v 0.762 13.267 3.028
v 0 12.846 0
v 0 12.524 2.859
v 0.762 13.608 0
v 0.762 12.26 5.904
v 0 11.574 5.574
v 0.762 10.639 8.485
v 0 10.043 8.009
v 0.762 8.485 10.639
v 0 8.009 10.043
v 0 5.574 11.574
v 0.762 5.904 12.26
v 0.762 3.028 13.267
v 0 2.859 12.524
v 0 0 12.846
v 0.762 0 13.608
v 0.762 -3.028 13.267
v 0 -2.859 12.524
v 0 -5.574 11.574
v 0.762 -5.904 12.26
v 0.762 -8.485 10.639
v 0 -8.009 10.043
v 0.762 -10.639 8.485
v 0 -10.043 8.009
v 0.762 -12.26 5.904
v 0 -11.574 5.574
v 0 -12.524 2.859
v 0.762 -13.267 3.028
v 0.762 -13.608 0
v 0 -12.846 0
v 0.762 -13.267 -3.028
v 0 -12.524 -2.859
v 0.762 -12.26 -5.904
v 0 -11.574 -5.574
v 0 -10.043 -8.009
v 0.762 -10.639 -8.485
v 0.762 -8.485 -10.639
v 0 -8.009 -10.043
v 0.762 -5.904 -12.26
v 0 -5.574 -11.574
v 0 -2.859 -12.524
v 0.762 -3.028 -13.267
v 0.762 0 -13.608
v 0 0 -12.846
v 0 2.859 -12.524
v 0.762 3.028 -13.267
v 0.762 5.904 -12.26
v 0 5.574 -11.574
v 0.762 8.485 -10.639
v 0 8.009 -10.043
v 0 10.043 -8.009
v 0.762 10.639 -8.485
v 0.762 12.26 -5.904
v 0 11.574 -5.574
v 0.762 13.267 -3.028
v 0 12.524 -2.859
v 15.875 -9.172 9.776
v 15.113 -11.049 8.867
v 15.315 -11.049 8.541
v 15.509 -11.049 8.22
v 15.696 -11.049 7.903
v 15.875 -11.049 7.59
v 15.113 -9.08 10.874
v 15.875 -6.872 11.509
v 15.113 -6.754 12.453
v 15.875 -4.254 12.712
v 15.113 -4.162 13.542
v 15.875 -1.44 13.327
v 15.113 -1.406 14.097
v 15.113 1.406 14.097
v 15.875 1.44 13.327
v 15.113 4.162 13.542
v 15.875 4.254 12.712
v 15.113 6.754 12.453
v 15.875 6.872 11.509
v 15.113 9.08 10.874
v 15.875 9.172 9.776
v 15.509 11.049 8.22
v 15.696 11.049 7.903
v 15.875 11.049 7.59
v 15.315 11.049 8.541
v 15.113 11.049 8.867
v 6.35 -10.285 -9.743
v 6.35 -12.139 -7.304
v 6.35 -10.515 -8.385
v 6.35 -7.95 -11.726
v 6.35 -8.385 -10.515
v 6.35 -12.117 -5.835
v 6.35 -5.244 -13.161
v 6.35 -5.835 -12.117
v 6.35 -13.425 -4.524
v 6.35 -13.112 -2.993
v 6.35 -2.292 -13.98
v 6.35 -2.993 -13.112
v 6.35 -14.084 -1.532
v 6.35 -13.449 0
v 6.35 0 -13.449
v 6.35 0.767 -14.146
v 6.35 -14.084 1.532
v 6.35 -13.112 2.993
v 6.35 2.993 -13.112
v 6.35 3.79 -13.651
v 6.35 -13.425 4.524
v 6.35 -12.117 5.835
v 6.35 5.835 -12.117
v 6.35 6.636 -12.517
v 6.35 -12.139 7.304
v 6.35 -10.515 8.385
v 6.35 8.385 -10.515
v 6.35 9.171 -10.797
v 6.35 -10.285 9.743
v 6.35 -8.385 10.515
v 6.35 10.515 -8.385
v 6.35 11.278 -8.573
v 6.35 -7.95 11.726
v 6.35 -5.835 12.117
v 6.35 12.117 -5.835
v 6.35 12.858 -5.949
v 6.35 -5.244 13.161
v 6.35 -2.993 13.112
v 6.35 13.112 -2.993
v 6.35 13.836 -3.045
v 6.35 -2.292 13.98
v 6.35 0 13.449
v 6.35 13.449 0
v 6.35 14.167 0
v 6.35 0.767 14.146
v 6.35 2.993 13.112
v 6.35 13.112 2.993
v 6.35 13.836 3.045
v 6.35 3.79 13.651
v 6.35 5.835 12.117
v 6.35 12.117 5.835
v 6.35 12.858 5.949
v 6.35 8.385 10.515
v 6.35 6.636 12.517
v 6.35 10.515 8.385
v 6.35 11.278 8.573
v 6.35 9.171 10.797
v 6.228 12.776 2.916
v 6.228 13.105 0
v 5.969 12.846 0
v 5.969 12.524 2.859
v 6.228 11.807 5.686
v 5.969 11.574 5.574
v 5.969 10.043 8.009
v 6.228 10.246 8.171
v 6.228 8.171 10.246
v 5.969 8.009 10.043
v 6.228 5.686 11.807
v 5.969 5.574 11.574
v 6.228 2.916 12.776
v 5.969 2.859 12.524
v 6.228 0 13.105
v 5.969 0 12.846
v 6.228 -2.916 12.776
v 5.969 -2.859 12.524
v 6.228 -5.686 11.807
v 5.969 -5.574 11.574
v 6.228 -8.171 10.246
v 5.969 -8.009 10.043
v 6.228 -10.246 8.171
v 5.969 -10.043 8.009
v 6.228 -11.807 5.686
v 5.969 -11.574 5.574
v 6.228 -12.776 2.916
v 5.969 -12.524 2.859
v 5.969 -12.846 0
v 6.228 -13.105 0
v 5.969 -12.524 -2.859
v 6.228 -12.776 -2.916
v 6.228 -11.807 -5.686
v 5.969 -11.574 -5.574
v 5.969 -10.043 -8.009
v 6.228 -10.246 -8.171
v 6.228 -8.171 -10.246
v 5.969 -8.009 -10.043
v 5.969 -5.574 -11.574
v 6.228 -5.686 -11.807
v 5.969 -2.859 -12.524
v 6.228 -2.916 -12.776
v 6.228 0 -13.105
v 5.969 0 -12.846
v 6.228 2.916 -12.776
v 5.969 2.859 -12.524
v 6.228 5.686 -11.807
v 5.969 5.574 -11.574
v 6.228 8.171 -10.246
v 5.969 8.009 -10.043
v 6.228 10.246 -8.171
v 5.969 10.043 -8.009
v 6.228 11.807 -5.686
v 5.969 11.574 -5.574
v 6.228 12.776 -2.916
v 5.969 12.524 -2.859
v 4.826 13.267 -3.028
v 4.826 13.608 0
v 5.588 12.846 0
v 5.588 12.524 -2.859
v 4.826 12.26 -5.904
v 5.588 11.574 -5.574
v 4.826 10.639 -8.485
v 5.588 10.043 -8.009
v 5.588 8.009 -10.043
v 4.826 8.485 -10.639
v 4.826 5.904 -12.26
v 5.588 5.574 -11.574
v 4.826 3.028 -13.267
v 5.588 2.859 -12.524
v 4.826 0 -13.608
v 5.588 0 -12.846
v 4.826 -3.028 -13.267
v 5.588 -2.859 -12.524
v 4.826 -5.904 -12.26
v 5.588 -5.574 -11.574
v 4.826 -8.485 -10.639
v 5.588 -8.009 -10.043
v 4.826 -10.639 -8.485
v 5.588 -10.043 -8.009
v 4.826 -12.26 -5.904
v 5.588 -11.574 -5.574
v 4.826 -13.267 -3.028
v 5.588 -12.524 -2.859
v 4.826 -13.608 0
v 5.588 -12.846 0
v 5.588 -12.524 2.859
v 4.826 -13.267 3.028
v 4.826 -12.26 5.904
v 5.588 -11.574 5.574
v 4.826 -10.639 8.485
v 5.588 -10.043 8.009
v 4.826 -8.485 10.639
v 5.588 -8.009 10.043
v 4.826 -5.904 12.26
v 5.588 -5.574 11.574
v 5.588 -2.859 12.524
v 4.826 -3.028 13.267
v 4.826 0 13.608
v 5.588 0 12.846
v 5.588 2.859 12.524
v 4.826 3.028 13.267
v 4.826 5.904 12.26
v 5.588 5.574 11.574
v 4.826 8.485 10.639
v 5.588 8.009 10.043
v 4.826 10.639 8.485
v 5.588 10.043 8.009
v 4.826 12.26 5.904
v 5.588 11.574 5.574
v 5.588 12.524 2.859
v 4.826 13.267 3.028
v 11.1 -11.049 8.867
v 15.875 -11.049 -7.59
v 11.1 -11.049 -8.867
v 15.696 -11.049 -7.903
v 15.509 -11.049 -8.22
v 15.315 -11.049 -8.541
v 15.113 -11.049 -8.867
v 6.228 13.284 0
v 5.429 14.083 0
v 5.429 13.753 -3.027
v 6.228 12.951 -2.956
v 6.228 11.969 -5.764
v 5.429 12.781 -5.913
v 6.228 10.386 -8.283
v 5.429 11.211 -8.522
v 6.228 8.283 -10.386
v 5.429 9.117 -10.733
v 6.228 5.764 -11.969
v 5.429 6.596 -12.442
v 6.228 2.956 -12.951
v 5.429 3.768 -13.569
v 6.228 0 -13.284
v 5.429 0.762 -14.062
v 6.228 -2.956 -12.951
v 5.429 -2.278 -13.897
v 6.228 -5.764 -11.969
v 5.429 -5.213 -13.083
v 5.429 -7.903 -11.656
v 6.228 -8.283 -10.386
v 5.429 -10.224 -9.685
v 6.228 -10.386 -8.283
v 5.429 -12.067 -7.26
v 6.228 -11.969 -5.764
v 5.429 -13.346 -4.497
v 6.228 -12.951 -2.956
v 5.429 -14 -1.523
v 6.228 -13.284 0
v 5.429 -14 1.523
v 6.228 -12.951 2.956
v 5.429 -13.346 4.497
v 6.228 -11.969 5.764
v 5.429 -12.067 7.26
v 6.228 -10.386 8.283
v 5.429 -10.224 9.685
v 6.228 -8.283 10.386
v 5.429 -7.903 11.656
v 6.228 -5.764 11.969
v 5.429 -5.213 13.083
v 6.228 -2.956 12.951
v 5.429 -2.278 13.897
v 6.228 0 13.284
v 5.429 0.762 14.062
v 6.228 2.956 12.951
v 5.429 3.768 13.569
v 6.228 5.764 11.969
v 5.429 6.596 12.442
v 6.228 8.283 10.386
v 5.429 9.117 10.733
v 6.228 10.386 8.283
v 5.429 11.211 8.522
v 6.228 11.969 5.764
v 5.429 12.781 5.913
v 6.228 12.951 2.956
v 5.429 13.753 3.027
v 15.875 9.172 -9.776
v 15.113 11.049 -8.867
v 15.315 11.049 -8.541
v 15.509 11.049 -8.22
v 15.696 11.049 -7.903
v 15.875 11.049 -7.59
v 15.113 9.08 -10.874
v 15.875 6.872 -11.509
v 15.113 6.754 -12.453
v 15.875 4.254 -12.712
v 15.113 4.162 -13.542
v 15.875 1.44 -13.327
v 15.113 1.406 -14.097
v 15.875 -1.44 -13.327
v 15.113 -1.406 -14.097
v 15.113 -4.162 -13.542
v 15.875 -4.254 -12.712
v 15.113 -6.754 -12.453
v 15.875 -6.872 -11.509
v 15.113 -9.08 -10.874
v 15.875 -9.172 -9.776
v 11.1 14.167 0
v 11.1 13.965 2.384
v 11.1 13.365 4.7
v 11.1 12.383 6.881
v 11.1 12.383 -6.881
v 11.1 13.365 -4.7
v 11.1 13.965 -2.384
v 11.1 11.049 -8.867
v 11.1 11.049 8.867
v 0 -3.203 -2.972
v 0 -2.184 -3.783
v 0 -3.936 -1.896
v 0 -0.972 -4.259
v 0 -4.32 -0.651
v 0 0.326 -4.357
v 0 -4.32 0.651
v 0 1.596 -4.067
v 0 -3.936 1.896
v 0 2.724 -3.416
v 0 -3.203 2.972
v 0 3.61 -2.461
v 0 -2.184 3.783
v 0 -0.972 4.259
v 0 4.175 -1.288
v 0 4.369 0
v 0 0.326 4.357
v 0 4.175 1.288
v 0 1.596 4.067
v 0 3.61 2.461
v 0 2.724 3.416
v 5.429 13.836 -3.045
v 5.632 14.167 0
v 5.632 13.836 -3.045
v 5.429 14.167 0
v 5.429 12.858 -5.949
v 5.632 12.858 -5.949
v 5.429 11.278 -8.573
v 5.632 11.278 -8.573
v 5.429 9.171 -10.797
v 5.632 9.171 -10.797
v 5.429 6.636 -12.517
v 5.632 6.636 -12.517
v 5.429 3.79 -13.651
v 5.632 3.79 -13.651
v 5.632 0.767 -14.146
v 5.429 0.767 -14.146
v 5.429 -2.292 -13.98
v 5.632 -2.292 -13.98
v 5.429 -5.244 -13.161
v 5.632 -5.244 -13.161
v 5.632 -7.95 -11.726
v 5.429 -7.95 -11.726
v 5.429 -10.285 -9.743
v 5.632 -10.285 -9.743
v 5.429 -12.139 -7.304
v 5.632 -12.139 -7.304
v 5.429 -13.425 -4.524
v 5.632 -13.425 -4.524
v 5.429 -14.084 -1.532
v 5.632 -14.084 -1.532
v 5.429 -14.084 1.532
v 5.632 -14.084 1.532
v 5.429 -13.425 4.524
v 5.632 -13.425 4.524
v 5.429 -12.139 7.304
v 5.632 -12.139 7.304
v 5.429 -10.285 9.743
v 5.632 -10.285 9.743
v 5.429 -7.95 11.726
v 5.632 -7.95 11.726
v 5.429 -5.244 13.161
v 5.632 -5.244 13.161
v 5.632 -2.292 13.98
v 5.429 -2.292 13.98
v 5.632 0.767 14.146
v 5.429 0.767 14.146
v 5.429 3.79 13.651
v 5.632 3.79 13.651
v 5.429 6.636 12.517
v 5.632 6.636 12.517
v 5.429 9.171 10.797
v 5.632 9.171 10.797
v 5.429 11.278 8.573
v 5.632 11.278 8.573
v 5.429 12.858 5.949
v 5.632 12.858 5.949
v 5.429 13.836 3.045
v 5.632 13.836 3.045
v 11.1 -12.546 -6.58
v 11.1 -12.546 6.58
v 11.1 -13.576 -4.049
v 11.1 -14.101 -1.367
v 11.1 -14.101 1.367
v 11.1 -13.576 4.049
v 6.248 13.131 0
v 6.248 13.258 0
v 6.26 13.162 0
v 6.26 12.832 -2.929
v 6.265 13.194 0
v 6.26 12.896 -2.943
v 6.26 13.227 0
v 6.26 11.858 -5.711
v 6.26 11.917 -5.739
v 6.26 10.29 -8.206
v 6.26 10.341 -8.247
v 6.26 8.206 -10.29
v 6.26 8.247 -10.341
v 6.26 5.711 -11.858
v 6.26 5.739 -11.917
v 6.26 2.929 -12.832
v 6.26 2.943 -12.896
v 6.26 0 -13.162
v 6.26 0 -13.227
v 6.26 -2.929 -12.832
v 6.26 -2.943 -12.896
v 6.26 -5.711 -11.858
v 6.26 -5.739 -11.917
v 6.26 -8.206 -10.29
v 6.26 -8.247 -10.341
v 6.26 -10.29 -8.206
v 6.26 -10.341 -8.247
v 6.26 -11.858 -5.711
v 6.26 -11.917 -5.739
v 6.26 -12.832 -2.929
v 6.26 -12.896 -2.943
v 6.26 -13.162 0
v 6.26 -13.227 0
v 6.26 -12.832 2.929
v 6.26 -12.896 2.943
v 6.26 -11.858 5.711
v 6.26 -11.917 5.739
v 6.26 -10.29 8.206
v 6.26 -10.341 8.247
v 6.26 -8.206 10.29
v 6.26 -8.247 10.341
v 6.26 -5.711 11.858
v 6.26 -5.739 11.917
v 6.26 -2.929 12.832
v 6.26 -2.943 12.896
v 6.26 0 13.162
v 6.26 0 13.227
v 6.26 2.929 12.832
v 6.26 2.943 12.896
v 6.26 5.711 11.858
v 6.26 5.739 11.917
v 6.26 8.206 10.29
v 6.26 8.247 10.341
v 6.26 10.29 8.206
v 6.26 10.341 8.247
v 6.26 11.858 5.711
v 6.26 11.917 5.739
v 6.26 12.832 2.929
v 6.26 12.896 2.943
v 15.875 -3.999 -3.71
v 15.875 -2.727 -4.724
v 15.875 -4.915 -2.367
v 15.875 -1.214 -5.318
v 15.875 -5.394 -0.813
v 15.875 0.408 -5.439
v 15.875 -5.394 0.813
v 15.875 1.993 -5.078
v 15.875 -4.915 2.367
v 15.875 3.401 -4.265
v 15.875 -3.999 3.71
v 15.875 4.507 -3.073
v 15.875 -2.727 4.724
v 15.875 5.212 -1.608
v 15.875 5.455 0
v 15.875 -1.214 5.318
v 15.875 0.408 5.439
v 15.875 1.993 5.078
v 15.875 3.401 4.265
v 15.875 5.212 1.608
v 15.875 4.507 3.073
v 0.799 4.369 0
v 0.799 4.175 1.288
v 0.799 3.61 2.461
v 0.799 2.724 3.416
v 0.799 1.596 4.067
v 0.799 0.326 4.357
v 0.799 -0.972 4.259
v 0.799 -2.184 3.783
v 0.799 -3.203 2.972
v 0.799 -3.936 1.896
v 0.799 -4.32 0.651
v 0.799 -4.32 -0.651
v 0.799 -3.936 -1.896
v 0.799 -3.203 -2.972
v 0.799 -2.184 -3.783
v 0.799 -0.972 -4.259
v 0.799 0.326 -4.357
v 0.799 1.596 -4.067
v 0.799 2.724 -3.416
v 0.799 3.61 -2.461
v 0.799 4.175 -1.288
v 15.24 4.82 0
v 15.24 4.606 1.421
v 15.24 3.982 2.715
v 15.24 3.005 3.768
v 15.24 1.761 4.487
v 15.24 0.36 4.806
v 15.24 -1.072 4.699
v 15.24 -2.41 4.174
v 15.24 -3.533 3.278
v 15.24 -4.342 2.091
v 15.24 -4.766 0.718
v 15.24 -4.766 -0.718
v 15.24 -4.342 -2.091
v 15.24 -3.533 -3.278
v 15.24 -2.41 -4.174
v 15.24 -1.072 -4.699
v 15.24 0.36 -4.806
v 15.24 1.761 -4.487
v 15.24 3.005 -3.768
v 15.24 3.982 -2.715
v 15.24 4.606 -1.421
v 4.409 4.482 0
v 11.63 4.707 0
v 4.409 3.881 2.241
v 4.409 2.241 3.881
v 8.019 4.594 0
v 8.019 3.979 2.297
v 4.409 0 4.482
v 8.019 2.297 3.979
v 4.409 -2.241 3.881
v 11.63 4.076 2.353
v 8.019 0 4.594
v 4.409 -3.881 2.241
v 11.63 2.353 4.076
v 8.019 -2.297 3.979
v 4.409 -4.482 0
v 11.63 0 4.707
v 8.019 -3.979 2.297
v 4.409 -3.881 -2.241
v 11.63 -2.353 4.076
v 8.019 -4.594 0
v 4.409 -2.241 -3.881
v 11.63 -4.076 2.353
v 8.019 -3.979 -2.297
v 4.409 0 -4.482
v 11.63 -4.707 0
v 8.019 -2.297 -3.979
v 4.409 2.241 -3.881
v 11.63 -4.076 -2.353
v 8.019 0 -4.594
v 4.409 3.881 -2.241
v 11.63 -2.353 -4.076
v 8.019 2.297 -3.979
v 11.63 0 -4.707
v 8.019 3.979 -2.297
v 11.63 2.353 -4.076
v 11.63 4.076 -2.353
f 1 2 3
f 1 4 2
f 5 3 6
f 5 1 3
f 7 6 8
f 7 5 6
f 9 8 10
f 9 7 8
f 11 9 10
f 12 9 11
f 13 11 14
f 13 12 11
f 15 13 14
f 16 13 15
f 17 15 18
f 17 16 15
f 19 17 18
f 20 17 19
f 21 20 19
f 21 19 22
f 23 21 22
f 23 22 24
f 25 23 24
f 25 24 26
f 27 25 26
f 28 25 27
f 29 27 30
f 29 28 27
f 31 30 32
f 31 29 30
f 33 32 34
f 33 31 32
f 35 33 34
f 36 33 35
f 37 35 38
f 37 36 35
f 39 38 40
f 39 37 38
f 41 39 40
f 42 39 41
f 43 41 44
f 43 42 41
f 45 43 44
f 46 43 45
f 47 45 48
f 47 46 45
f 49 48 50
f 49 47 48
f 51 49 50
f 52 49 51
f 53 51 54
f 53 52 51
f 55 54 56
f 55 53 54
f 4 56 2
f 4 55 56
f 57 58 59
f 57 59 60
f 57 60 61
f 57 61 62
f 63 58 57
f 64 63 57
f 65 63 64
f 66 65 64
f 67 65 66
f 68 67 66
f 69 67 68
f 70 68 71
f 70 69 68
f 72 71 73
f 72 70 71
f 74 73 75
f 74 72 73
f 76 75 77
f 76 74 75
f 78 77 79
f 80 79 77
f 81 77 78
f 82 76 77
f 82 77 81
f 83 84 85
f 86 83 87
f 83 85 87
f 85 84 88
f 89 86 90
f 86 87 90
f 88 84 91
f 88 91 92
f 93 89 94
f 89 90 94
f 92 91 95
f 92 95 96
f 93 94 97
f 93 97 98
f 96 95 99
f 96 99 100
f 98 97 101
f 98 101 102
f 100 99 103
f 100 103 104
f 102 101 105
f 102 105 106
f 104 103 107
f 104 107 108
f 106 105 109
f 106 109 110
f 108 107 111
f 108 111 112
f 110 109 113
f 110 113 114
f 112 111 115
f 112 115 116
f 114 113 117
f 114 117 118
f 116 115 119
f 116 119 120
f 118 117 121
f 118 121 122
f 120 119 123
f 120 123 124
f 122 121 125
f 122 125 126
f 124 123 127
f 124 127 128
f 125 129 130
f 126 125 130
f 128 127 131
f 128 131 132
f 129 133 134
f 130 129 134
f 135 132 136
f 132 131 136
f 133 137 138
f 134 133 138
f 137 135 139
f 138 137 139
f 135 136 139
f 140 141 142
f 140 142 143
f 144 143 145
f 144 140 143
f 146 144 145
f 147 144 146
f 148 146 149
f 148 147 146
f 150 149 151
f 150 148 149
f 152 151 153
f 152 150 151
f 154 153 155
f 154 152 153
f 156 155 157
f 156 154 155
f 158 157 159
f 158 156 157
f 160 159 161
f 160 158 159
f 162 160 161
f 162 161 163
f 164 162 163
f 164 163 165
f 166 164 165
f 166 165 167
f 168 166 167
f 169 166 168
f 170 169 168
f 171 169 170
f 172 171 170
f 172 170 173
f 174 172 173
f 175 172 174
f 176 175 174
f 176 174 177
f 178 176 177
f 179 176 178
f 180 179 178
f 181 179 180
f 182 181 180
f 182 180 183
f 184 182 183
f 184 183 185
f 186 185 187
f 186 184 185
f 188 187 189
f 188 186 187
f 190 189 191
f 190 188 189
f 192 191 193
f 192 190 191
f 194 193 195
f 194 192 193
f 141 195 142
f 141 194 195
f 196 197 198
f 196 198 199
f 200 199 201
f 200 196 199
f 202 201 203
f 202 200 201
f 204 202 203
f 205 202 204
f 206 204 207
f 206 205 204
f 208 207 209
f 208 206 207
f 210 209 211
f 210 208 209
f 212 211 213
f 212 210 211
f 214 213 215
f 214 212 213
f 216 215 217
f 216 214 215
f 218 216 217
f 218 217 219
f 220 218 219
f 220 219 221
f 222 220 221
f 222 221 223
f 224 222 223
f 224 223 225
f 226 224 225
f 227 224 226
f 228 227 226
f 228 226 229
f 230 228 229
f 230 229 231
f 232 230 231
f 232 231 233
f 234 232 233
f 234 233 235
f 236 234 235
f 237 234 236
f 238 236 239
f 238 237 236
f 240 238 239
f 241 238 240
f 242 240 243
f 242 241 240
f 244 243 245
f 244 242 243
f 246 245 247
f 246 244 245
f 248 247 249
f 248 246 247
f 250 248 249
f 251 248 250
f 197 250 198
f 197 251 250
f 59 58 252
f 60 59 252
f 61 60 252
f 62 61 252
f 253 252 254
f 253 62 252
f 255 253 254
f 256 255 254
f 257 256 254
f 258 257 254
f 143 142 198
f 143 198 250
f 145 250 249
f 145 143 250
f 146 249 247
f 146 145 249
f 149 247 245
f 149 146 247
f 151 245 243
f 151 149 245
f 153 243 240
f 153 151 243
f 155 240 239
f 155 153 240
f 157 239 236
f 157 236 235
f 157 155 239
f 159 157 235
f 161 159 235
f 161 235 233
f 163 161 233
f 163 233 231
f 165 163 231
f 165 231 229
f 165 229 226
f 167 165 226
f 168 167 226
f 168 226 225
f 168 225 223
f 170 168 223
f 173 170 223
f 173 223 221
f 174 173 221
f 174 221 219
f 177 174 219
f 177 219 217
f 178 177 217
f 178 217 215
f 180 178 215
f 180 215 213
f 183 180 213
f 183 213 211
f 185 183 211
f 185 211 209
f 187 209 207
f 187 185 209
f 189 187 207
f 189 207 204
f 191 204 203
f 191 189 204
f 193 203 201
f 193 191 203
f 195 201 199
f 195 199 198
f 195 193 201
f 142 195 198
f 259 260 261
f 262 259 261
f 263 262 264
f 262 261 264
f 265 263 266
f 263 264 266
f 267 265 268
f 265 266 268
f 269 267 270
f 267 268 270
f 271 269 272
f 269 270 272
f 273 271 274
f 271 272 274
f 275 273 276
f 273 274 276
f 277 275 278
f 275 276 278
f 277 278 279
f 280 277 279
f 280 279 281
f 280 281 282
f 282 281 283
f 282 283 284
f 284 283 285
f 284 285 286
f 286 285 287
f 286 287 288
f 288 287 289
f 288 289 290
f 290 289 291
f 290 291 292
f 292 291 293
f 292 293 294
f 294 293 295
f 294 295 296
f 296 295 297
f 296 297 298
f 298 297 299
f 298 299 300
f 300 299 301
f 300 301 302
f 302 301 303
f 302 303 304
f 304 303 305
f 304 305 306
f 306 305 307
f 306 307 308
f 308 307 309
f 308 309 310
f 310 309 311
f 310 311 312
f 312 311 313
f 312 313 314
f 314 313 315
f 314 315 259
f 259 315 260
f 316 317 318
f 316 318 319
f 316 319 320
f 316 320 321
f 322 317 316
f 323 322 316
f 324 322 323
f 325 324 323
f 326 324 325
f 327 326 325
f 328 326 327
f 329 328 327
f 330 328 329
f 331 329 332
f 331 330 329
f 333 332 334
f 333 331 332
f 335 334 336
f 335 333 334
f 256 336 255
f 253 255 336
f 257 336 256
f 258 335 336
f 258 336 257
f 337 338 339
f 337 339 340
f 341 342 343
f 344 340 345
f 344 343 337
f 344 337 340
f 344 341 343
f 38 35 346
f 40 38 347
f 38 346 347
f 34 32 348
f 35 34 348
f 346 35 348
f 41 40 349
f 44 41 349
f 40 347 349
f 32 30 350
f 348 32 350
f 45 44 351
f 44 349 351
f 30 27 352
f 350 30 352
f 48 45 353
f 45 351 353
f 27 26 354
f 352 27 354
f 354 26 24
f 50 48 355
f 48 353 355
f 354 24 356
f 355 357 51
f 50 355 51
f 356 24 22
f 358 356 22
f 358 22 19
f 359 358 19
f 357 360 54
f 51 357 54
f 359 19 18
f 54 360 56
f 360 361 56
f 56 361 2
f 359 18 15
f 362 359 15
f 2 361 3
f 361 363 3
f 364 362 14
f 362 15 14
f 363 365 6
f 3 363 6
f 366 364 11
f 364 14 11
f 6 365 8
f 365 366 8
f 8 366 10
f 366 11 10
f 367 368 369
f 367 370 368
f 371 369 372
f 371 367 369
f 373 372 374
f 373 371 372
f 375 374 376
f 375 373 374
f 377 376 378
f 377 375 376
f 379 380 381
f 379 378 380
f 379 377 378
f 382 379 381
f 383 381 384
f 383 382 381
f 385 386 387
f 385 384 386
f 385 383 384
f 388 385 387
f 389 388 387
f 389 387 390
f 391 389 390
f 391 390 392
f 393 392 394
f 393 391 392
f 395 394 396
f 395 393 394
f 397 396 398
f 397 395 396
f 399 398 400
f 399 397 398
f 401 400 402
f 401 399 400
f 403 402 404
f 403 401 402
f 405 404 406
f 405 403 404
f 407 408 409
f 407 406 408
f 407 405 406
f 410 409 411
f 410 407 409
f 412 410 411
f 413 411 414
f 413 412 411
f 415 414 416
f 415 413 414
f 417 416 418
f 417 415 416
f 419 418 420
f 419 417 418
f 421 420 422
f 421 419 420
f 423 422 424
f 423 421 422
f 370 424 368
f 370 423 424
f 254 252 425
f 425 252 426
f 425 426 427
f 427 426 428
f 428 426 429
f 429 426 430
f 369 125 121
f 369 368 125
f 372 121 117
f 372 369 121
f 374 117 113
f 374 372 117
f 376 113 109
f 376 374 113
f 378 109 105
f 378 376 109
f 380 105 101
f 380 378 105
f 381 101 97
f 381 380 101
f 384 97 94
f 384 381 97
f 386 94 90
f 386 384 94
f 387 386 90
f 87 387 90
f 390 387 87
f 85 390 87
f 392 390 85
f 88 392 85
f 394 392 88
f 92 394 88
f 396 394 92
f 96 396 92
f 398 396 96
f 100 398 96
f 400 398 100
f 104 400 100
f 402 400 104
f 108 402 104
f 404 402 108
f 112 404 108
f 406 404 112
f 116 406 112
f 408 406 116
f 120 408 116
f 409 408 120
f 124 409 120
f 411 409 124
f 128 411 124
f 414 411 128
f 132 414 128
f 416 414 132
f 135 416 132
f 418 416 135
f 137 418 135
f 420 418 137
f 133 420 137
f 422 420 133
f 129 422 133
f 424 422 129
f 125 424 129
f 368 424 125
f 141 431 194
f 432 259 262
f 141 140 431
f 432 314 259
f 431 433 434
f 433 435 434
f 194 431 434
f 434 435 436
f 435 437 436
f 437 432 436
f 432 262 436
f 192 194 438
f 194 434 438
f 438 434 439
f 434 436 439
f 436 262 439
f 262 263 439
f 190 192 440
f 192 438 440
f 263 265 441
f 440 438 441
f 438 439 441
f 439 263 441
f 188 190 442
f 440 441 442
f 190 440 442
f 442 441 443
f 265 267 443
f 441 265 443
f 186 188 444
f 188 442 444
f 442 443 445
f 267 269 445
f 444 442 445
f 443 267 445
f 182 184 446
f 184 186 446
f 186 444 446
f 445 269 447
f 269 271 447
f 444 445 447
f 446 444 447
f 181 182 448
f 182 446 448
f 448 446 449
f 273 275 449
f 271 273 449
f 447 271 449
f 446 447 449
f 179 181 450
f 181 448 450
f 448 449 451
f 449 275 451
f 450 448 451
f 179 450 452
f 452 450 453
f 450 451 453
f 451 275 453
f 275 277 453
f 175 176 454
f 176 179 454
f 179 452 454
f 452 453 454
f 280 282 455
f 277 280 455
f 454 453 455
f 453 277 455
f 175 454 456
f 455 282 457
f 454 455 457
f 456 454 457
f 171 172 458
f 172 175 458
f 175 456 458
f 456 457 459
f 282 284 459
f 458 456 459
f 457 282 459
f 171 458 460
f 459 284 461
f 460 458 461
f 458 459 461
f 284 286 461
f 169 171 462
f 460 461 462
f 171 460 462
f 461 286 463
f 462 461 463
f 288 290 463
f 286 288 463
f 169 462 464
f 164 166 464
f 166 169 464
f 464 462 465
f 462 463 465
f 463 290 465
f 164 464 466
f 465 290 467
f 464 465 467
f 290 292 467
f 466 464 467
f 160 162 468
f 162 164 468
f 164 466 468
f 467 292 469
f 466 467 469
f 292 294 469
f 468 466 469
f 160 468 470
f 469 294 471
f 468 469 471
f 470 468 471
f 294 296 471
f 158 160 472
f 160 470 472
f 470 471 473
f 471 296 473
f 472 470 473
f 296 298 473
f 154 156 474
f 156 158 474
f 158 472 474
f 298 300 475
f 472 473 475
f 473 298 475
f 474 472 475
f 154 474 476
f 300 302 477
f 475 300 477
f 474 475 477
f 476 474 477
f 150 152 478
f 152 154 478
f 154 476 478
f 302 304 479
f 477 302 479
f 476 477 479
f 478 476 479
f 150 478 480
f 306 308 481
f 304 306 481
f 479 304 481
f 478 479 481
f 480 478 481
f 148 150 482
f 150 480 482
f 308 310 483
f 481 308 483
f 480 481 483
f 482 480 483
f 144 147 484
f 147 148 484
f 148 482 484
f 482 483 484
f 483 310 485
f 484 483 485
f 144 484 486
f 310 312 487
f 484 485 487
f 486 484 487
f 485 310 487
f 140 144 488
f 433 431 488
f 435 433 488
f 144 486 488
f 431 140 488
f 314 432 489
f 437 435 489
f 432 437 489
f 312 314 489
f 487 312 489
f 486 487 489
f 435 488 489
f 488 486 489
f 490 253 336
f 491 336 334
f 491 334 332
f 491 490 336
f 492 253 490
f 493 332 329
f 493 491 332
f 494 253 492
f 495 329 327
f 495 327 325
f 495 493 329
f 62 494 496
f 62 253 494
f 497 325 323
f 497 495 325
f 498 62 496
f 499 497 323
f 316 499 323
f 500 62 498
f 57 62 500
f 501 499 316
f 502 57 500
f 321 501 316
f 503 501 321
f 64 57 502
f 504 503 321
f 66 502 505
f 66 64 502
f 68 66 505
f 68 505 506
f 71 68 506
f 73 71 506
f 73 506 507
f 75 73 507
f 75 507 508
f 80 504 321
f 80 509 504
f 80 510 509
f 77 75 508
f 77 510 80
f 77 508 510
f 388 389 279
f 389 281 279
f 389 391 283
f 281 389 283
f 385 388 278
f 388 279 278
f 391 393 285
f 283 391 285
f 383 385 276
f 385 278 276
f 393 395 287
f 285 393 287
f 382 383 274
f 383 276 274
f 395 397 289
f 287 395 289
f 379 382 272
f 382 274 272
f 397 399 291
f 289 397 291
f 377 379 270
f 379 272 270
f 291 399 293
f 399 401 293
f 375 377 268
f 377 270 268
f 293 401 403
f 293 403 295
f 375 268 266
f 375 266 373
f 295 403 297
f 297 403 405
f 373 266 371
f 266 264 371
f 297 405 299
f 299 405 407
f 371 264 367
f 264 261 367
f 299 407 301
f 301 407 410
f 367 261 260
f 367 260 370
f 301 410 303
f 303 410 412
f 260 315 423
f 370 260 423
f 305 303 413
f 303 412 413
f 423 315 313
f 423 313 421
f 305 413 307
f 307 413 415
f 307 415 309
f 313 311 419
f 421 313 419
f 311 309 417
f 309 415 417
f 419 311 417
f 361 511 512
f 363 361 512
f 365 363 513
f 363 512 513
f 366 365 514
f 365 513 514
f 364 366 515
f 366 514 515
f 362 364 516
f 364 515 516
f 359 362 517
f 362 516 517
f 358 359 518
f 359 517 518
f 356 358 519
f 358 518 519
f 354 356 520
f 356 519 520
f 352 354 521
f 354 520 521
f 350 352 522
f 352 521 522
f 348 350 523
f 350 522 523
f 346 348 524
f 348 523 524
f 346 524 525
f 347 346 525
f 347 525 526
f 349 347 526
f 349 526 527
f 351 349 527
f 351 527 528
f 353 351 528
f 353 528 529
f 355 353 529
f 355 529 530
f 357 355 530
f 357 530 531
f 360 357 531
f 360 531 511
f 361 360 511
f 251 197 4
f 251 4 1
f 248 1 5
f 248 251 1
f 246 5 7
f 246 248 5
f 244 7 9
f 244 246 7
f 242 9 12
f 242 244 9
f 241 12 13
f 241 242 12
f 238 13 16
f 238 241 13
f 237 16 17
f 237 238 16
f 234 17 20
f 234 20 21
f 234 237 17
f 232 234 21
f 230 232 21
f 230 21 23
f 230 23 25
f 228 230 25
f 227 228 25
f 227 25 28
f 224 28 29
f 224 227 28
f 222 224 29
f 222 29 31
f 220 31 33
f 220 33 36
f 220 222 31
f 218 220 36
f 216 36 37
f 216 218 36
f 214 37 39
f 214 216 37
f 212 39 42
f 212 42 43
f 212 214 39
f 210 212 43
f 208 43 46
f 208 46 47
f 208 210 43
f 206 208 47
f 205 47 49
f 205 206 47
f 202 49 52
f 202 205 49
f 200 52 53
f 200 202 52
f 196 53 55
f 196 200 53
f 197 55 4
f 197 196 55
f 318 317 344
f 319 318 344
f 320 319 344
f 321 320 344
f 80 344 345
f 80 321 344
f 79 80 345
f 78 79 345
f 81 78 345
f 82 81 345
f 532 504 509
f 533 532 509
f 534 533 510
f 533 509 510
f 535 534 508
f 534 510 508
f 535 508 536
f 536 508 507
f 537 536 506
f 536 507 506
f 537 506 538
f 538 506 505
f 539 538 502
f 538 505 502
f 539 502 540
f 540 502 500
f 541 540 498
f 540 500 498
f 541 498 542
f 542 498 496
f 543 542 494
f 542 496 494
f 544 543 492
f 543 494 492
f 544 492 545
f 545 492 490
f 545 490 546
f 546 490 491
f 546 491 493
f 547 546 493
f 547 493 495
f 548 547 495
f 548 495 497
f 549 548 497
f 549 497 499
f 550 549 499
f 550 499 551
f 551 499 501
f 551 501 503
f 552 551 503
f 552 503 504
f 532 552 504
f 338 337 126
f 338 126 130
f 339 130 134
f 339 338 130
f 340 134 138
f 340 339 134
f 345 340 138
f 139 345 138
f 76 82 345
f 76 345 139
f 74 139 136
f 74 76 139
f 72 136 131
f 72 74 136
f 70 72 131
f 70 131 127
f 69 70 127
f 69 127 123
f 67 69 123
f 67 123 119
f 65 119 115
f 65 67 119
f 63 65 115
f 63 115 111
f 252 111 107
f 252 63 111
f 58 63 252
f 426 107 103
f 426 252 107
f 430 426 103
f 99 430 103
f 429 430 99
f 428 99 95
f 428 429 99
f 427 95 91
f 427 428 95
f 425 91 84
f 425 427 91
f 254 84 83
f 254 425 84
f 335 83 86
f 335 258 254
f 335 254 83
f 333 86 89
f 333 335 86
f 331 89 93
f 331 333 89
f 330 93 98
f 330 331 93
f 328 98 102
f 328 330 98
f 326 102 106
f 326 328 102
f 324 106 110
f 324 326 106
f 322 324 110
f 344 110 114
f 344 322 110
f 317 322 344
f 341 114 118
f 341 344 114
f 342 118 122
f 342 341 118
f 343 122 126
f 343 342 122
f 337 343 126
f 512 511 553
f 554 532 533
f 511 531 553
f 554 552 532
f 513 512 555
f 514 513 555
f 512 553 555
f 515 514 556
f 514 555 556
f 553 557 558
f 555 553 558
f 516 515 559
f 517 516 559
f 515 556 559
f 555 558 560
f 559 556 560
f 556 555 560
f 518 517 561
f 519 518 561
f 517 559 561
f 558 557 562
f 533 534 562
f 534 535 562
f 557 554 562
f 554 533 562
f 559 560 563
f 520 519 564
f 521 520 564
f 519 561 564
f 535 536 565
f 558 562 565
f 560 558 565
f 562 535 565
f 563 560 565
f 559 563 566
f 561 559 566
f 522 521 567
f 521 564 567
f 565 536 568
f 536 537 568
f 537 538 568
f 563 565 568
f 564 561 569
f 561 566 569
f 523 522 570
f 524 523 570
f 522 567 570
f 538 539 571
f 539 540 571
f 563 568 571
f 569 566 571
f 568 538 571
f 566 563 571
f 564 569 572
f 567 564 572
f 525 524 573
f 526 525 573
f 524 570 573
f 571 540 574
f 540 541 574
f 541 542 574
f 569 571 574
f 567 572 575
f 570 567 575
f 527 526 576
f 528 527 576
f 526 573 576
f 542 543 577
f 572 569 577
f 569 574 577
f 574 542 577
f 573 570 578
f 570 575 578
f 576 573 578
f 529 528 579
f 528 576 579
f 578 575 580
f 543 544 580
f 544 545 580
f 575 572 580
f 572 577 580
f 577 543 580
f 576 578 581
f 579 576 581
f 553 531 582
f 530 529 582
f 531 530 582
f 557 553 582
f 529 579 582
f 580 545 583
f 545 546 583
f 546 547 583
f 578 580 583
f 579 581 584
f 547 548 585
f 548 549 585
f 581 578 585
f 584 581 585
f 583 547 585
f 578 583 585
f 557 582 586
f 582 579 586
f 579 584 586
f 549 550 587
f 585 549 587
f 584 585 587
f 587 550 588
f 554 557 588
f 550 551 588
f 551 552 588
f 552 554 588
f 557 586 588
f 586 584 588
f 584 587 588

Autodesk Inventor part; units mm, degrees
sketch "Sketch_1" plane through (0, 0, 0) normal (0, 0, 1) x (1, 0, 0)
  line L0 (15.875, 0) -> (0, 0)
  line L1 (0, 0) -> (0, 12.846)
  line L2 (0, 12.846) -> (0.762, 13.6081)
  line L3 (0.762, 13.6081) -> (4.826, 13.6081)
  line L4 (4.826, 13.6081) -> (5.588, 12.846)
  line L5 (5.588, 12.846) -> (6.35, 12.846)
  line L6 (6.35, 12.846) -> (6.35, 14.1669)
  line L7 (6.35, 14.1669) -> (15.113, 14.1669)
  line L8 (15.113, 14.1669) -> (15.875, 13.4049)
  line L9 (15.875, 13.4049) -> (15.875, 0)
  line L10 (15.875, 0) -> (0, 0)
revolve "Revolution1" add sketch "Sketch_1" angle 360 about axis through (15.875, 0, 0) along (1, 0, 0)
sketch "Sketch_6" plane through (0, 0, 0) normal (0, 0, 1) x (1, 0, 0)
  line L0 (15.875, 0) -> (0, 0)
  line L1 (0, 0) -> (0, 4.3688)
  line L2 (0, 4.3688) -> (0.7987, 4.3688)
  line L3 (0.7987, 4.3688) -> (15.24, 4.8197)
  line L4 (15.24, 4.8197) -> (15.875, 5.4547)
  line L5 (15.875, 5.4547) -> (15.875, 0)
  line L6 (15.875, 0) -> (0, 0)
revolve "Revolution2" cut sketch "Sketch_6" angle 360 about axis through (15.875, 0, 0) along (1, 0, 0)
thread "Thread1" size "1/8" designation "1/8 - 27 NPT" standard "NPT" length 6.3022
sketch "Sketch_5" plane through (15.875, 0, 0) normal (1, 0, 0) x (0, 0, -1)
  line L0 (-56.6674, -28.3337) -> (56.6674, -28.3337)
  line L1 (56.6674, -28.3337) -> (56.6674, 28.3337)
  line L2 (56.6674, 28.3337) -> (-56.6674, 28.3337)
  line L3 (-56.6674, 28.3337) -> (-56.6674, -28.3337)
  line L4 (-28.3337, -11.049) -> (28.3337, -11.049)
  line L5 (28.3337, -11.049) -> (28.3337, 11.049)
  line L6 (28.3337, 11.049) -> (-28.3337, 11.049)
  line L7 (-28.3337, 11.049) -> (-28.3337, -11.049)
extrude "Extrusion1" cut sketch "Sketch_5" against normal blind 4.7752
sketch "Sketch_24" plane through (0, 0, 0) normal (0, 0, 1) x (1, 0, 0)
  line L0 (6.35, 0) -> (5.588, 0)
  line L1 (5.429, 14.1669) -> (5.429, 14.0827)
  line L2 (5.429, 14.0827) -> (6.2275, 13.2842)
  arc A0 (6.2275, 13.1046) -> (6.2275, 13.2842) centre (6.1377, 13.1944) ccw
  line L3 (6.2275, 13.1046) -> (5.969, 12.846)
  line L4 (5.969, 12.846) -> (5.588, 12.846)
  line L5 (5.588, 12.846) -> (5.588, 12.5921)
  line L6 (5.588, 12.5921) -> (6.35, 12.5921)
  line L7 (6.35, 12.5921) -> (6.35, 13.449)
  line L8 (6.35, 13.449) -> (5.6322, 14.1669)
  line L9 (5.6322, 14.1669) -> (5.429, 14.1669)
revolve "Revolution3" add sketch "Sketch_24" angle 360 about axis through (6.35, 0, 0) along (1, 0, 0)
ref_plane "cut1_XY" through (15.875, 11.049, 0) normal (1, 0, 0) x (0, 0, -1)
ref_plane "cut1_YZ" through (15.875, 11.049, 0) normal (0, 0, -1) x (0, 1, 0)
ref_plane "cut1_ZX" through (15.875, 11.049, 0) normal (0, 1, 0) x (1, 0, 0)
ref_plane "cut2_XY" through (15.875, -11.049, 0) normal (1, 0, 0) x (0, 0, -1)
ref_plane "cut2_YZ" through (15.875, -11.049, 0) normal (0, 0, -1) x (0, 1, 0)
ref_plane "cut2_ZX" through (15.875, -11.049, 0) normal (0, 1, 0) x (1, 0, 0)
ref_plane "cutf1_XY" through (15.875, 0, 0) normal (0, 0, 1) x (1, 0, 0)
ref_plane "cutf1_YZ" through (15.875, 0, 0) normal (1, 0, 0) x (0, 1, 0)
ref_plane "cutf1_ZX" through (15.875, 0, 0) normal (0, 1, 0) x (0, 0, 1)
ref_plane "cutf2_XY" through (11.0998, 0, 0) normal (0, 0, 1) x (1, 0, 0)
ref_plane "cutf2_YZ" through (11.0998, 0, 0) normal (1, 0, 0) x (0, 1, 0)
ref_plane "cutf2_ZX" through (11.0998, 0, 0) normal (0, 1, 0) x (0, 0, 1)
ref_plane "lovra_XY" through (15.875, 0, 0) normal (1, 0, 0) x (0, 1, 0)
ref_plane "lovra_YZ" through (15.875, 0, 0) normal (0, 1, 0) x (0, 0, 1)
ref_plane "lovra_ZX" through (15.875, 0, 0) normal (0, 0, 1) x (1, 0, 0)
ref_plane "lovra1_XY" through (11.0998, 0, 0) normal (1, 0, 0) x (0, 0, -1)
ref_plane "lovra1_YZ" through (11.0998, 0, 0) normal (0, 0, -1) x (0, 1, 0)
ref_plane "lovra1_ZX" through (11.0998, 0, 0) normal (0, 1, 0) x (1, 0, 0)
ref_plane "lovra2_XY" through (11.0998, 11.049, 0) normal (1, 0, 0) x (0, 0, -1)
ref_plane "lovra2_YZ" through (11.0998, 11.049, 0) normal (0, 0, -1) x (0, 1, 0)
ref_plane "lovra2_ZX" through (11.0998, 11.049, 0) normal (0, 1, 0) x (1, 0, 0)
ref_plane "lovra21_XY" through (0, 0, 5.2705) normal (1, 0, 0) x (0, 0, -1)
ref_plane "lovra21_YZ" through (0, 0, 5.2705) normal (0, 0, -1) x (0, 1, 0)
ref_plane "lovra21_ZX" through (0, 0, 5.2705) normal (0, 1, 0) x (1, 0, 0)
ref_plane "lovra22_XY" through (0, 0, -5.2705) normal (1, 0, 0) x (0, 0, -1)
ref_plane "lovra22_YZ" through (0, 0, -5.2705) normal (0, 0, -1) x (0, 1, 0)
ref_plane "lovra22_ZX" through (0, 0, -5.2705) normal (0, 1, 0) x (1, 0, 0)
ref_plane "lovra3_XY" through (11.0998, -11.049, 0) normal (1, 0, 0) x (0, 0, -1)
ref_plane "lovra3_YZ" through (11.0998, -11.049, 0) normal (0, 0, -1) x (0, 1, 0)
ref_plane "lovra3_ZX" through (11.0998, -11.049, 0) normal (0, 1, 0) x (1, 0, 0)
ref_plane "olen_XY" through (15.875, 0, 0) normal (1, 0, 0) x (0, 0, -1)
ref_plane "olen_YZ" through (15.875, 0, 0) normal (0, 0, -1) x (0, 1, 0)
ref_plane "olen_ZX" through (15.875, 0, 0) normal (0, 1, 0) x (1, 0, 0)
ref_plane "to_mounting_bracket_XY" through (22.225, 0, 0) normal (1, 0, 0) x (0, 0, -1)
ref_plane "to_mounting_bracket_YZ" through (22.225, 0, 0) normal (0, 0, -1) x (0, 1, 0)
ref_plane "to_mounting_bracket_ZX" through (22.225, 0, 0) normal (0, 1, 0) x (1, 0, 0)
ref_plane "to_nut_XY" through (0, 0, 0) normal (1, 0, 0) x (0, 0, -1)
ref_plane "to_nut_YZ" through (0, 0, 0) normal (0, 0, -1) x (0, 1, 0)
ref_plane "to_nut_ZX" through (0, 0, 0) normal (0, 1, 0) x (1, 0, 0)
ref_plane "to_pin_XY" through (30.9626, 0, 0) normal (0, 0, 1) x (1, 0, 0)
ref_plane "to_pin_YZ" through (30.9626, 0, 0) normal (1, 0, 0) x (0, 1, 0)
ref_plane "to_pin_ZX" through (30.9626, 0, 0) normal (0, 1, 0) x (0, 0, 1)
ref_plane "to_screw_XY" through (15.0876, 10.2743, -7.0612) normal (0, 1, 0) x (1, 0, 0)
ref_plane "to_screw_YZ" through (15.0876, 10.2743, -7.0612) normal (1, 0, 0) x (0, 0, -1)
ref_plane "to_screw_ZX" through (15.0876, 10.2743, -7.0612) normal (0, 0, -1) x (0, 1, 0)
ref_plane "to_tube_XY" through (5.588, 0, 0) normal (1, 0, 0) x (0, 0, -1)
ref_plane "to_tube_YZ" through (5.588, 0, 0) normal (0, 0, -1) x (0, 1, 0)
ref_plane "to_tube_ZX" through (5.588, 0, 0) normal (0, 1, 0) x (1, 0, 0)
properties part number "090000_rear_head"
